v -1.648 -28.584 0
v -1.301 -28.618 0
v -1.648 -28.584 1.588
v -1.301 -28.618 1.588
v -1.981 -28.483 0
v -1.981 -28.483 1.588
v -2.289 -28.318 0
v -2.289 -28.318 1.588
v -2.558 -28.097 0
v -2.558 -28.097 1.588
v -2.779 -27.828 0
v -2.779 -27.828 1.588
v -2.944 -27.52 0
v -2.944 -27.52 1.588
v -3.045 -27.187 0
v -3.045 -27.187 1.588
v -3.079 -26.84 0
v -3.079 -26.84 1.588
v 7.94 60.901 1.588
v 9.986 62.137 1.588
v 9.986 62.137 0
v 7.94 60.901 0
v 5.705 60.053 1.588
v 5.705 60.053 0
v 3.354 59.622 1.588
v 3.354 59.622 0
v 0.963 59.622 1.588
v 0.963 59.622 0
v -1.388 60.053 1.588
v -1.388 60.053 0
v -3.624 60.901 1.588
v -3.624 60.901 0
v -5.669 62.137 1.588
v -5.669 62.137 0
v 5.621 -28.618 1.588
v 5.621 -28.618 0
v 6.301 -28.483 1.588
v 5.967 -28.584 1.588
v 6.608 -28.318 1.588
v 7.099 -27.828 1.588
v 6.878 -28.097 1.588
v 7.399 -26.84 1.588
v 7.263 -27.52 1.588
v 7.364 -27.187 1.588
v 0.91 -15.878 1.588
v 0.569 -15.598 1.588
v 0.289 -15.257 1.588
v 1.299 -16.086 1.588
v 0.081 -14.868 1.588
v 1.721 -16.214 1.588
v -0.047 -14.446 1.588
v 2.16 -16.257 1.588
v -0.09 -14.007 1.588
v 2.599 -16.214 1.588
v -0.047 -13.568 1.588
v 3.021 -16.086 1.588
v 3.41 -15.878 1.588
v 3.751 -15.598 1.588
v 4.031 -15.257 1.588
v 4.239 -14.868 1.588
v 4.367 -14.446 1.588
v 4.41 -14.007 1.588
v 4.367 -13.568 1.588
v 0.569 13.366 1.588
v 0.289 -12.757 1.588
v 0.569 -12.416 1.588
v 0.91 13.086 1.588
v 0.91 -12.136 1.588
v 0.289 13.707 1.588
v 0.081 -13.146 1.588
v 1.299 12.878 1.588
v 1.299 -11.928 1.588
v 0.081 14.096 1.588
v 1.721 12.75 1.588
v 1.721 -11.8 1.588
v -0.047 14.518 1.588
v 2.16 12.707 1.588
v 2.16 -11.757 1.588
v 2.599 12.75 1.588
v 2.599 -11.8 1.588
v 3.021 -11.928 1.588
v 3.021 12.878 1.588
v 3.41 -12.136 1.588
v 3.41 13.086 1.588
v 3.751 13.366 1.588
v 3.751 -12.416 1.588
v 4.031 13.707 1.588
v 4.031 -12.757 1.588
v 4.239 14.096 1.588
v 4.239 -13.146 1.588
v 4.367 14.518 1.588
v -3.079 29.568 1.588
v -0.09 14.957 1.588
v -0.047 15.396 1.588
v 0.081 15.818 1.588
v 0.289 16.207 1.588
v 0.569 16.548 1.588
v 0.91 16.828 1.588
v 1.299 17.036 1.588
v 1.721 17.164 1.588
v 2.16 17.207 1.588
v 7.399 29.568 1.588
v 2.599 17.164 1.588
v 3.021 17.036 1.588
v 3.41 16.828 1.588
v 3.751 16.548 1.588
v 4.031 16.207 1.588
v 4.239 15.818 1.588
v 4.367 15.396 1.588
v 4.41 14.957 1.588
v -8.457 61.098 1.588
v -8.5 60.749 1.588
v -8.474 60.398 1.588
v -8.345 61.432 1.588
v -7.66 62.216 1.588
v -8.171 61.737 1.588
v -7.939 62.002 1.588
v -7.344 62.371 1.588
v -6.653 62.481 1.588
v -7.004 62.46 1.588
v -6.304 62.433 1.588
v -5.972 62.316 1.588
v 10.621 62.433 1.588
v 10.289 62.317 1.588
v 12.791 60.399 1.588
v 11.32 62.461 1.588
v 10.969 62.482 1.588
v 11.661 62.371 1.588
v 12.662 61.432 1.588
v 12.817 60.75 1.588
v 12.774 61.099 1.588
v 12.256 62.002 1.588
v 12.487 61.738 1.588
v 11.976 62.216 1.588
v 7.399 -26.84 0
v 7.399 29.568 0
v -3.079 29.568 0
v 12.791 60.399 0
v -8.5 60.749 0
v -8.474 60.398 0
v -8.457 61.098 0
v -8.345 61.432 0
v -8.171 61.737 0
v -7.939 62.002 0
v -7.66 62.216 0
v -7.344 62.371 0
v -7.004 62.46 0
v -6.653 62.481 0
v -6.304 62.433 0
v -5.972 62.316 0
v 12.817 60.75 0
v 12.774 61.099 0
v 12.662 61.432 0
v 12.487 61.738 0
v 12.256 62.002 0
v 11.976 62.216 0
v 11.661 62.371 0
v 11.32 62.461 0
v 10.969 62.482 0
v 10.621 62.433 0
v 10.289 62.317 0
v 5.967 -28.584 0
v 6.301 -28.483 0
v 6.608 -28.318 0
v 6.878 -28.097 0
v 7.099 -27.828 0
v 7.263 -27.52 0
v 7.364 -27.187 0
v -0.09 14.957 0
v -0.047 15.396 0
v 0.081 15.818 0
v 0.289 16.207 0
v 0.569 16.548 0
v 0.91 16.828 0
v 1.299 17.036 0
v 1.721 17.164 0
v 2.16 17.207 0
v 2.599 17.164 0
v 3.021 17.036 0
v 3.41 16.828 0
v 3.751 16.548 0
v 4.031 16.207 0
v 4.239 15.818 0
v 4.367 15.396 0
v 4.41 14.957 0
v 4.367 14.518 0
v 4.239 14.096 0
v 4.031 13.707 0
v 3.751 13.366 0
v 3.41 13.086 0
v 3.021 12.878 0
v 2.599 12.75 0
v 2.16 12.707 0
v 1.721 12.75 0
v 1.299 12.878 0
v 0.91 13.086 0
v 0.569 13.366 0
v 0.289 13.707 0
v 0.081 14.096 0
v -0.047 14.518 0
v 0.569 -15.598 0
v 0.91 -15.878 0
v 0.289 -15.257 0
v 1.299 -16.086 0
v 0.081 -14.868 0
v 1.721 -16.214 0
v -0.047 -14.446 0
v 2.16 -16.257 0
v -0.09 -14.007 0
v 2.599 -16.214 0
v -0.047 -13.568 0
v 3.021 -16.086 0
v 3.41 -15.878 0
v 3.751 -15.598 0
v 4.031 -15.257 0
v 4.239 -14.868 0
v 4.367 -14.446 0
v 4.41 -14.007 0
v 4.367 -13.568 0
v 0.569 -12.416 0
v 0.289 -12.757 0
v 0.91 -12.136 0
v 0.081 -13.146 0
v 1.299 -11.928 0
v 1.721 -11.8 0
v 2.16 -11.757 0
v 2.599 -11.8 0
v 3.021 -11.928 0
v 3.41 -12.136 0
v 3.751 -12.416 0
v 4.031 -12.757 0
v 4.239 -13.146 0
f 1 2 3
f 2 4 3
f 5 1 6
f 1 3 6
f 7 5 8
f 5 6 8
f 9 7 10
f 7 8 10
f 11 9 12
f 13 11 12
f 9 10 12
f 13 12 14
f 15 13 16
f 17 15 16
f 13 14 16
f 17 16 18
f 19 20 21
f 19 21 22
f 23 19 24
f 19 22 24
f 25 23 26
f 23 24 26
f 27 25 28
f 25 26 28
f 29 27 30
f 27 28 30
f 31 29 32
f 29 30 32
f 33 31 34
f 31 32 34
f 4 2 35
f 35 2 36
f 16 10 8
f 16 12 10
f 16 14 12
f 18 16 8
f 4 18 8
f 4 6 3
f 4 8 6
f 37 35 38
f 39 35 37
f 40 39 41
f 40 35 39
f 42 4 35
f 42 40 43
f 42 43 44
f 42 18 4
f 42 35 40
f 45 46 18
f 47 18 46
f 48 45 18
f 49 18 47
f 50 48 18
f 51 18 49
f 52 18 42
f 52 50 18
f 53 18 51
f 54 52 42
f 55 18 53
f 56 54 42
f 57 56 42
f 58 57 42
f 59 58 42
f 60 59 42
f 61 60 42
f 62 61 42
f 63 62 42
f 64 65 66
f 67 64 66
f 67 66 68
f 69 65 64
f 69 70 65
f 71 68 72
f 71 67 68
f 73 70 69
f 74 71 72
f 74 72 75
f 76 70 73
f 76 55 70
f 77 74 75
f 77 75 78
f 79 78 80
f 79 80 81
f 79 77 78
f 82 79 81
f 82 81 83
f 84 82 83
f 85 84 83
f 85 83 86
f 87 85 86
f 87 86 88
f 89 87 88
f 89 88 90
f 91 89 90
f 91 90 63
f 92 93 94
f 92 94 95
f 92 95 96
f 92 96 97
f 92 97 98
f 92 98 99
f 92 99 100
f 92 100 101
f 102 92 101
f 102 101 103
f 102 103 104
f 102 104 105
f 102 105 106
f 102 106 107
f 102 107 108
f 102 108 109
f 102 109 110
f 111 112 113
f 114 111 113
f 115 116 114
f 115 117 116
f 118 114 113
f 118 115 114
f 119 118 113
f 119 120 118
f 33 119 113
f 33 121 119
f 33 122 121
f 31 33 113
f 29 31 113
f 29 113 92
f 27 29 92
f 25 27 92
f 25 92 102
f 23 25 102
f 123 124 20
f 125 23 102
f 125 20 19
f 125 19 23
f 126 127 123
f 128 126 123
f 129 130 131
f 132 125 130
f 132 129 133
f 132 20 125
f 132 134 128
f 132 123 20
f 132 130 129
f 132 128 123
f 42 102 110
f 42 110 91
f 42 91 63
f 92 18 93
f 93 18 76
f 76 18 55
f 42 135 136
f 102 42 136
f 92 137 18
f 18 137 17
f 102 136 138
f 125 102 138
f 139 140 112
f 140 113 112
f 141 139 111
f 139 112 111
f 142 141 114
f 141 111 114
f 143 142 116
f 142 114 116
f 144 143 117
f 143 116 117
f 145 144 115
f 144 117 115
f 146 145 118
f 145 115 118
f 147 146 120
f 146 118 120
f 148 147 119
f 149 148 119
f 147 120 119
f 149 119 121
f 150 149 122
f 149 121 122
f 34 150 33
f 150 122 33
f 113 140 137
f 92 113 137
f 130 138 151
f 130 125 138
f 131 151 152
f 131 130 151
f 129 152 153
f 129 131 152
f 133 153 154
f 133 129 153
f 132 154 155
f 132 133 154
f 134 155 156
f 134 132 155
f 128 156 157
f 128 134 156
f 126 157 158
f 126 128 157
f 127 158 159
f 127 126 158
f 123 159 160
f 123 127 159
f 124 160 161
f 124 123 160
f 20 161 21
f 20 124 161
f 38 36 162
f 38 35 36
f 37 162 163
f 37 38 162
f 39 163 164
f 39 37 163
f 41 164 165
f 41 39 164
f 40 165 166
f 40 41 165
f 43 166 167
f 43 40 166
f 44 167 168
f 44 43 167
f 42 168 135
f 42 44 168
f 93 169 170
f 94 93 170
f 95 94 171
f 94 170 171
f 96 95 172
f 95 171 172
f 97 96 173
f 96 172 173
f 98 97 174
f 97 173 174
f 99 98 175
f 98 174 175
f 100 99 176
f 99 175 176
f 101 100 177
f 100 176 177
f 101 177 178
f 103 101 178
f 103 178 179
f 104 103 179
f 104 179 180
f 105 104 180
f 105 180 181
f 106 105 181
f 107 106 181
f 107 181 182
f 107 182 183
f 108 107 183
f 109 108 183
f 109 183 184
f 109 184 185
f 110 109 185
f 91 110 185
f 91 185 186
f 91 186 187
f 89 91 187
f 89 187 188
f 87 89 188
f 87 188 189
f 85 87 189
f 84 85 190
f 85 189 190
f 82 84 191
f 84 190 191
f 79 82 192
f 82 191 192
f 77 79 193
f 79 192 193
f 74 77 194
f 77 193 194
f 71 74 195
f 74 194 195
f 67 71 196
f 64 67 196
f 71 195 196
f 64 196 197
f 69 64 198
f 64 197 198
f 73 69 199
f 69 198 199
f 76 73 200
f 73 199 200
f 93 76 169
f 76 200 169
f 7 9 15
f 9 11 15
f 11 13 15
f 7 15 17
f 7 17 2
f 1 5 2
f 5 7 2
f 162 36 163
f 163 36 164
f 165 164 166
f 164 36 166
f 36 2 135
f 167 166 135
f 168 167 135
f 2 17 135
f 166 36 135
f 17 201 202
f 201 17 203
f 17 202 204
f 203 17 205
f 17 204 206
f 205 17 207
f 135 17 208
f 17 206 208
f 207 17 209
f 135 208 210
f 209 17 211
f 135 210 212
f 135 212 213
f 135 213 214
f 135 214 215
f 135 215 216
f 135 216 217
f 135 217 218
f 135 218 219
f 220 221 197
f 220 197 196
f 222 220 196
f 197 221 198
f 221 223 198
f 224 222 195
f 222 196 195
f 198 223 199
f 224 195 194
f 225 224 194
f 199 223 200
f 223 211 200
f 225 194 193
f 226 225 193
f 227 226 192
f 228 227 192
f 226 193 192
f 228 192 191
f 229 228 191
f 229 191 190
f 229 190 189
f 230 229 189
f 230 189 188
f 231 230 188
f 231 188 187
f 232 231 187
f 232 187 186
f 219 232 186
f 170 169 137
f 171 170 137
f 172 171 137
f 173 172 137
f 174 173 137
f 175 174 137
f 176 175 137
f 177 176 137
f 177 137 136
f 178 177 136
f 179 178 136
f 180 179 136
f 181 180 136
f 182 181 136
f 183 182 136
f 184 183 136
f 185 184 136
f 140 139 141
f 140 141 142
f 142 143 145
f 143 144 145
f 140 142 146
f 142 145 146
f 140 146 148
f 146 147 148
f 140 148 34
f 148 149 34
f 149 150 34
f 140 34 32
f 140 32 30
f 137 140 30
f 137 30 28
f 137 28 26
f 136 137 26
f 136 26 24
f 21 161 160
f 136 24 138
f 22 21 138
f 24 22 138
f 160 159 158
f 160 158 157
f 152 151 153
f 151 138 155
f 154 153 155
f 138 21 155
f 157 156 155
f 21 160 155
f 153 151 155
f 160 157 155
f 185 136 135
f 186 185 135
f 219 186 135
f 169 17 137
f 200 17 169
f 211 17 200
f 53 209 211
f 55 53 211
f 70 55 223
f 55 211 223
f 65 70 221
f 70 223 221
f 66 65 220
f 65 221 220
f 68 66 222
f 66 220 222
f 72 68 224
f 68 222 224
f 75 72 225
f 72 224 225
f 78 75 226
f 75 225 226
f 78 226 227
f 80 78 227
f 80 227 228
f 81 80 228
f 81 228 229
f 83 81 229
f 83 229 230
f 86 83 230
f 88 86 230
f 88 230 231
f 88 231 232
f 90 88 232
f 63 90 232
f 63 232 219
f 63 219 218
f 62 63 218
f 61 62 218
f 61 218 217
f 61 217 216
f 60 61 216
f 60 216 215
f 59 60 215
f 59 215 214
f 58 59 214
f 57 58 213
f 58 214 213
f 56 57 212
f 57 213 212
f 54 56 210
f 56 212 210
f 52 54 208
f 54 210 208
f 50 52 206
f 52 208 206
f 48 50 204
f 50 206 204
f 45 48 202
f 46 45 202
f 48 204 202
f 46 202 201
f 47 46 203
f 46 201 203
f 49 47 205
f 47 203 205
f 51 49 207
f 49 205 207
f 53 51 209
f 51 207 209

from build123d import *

# Parameters (mm, degrees)
SKETCH1_R            = 2
BOSS_EXTRUDE1_DEPTH  = 1.5875
FILLET2_R            = 1.778
M4_CLEARANCE_HOLE2_D = 4.5


with BuildPart() as part:
    # Sketch1 → Boss-Extrude1 (new body)
    with BuildSketch(Plane.XY):
        with BuildLine():
            Line((-3.078924099, -28.617866551), (2.159951047, -28.617866551))
            Line((2.159951047, -28.617866551), (7.398508015, -28.617866551))
            Line((7.398508015, -28.617866551), (7.398508015, 29.568125765))
            Line((7.398508015, 29.568125765), (13.896694252, 66.719401178))
            ThreePointArc((13.896694252, 66.719401178), (2.158041982, 59.568125704), (-9.580610288, 66.719401178))
            Line((-9.580610288, 66.719401178), (-3.078924099, 29.568125765))
            Line((-3.078924099, 29.568125765), (-3.078924099, -28.617866551))
        make_face()
        with BuildLine():
            ThreePointArc((4.159951047, -14.006866551), (3.574164609, -15.421080114), (2.159951047, -16.006866551))
            ThreePointArc((2.159951047, -16.006866551), (0.745737485, -12.592652989), (4.159951047, -14.006866551))
        make_face(mode=Mode.SUBTRACT)
        with Locations((2.159951047, 14.957125769)):
            Circle(SKETCH1_R, mode=Mode.SUBTRACT)
    extrude(amount=BOSS_EXTRUDE1_DEPTH)

    # Fillet2
    fillet2_edges = [part.edges().sort_by_distance(p)[0] for p in [
        (-9.580610288, 66.719401178, 0.79375),
        (13.896694252, 66.719401178, 0.79375),
        (7.398508015, -28.617866551, 0.79375),
        (-3.078924099, -28.617866551, 0.79375),
    ]]
    fillet(fillet2_edges, radius=FILLET2_R)

    # M4 Clearance Hole2 (through all)
    with Locations(Plane.XY.offset(1.5875)):
        with Locations((2.159951047, 14.957125769), (2.159951047, -14.006866551)):
            Hole(M4_CLEARANCE_HOLE2_D / 2)


solid = part.part
